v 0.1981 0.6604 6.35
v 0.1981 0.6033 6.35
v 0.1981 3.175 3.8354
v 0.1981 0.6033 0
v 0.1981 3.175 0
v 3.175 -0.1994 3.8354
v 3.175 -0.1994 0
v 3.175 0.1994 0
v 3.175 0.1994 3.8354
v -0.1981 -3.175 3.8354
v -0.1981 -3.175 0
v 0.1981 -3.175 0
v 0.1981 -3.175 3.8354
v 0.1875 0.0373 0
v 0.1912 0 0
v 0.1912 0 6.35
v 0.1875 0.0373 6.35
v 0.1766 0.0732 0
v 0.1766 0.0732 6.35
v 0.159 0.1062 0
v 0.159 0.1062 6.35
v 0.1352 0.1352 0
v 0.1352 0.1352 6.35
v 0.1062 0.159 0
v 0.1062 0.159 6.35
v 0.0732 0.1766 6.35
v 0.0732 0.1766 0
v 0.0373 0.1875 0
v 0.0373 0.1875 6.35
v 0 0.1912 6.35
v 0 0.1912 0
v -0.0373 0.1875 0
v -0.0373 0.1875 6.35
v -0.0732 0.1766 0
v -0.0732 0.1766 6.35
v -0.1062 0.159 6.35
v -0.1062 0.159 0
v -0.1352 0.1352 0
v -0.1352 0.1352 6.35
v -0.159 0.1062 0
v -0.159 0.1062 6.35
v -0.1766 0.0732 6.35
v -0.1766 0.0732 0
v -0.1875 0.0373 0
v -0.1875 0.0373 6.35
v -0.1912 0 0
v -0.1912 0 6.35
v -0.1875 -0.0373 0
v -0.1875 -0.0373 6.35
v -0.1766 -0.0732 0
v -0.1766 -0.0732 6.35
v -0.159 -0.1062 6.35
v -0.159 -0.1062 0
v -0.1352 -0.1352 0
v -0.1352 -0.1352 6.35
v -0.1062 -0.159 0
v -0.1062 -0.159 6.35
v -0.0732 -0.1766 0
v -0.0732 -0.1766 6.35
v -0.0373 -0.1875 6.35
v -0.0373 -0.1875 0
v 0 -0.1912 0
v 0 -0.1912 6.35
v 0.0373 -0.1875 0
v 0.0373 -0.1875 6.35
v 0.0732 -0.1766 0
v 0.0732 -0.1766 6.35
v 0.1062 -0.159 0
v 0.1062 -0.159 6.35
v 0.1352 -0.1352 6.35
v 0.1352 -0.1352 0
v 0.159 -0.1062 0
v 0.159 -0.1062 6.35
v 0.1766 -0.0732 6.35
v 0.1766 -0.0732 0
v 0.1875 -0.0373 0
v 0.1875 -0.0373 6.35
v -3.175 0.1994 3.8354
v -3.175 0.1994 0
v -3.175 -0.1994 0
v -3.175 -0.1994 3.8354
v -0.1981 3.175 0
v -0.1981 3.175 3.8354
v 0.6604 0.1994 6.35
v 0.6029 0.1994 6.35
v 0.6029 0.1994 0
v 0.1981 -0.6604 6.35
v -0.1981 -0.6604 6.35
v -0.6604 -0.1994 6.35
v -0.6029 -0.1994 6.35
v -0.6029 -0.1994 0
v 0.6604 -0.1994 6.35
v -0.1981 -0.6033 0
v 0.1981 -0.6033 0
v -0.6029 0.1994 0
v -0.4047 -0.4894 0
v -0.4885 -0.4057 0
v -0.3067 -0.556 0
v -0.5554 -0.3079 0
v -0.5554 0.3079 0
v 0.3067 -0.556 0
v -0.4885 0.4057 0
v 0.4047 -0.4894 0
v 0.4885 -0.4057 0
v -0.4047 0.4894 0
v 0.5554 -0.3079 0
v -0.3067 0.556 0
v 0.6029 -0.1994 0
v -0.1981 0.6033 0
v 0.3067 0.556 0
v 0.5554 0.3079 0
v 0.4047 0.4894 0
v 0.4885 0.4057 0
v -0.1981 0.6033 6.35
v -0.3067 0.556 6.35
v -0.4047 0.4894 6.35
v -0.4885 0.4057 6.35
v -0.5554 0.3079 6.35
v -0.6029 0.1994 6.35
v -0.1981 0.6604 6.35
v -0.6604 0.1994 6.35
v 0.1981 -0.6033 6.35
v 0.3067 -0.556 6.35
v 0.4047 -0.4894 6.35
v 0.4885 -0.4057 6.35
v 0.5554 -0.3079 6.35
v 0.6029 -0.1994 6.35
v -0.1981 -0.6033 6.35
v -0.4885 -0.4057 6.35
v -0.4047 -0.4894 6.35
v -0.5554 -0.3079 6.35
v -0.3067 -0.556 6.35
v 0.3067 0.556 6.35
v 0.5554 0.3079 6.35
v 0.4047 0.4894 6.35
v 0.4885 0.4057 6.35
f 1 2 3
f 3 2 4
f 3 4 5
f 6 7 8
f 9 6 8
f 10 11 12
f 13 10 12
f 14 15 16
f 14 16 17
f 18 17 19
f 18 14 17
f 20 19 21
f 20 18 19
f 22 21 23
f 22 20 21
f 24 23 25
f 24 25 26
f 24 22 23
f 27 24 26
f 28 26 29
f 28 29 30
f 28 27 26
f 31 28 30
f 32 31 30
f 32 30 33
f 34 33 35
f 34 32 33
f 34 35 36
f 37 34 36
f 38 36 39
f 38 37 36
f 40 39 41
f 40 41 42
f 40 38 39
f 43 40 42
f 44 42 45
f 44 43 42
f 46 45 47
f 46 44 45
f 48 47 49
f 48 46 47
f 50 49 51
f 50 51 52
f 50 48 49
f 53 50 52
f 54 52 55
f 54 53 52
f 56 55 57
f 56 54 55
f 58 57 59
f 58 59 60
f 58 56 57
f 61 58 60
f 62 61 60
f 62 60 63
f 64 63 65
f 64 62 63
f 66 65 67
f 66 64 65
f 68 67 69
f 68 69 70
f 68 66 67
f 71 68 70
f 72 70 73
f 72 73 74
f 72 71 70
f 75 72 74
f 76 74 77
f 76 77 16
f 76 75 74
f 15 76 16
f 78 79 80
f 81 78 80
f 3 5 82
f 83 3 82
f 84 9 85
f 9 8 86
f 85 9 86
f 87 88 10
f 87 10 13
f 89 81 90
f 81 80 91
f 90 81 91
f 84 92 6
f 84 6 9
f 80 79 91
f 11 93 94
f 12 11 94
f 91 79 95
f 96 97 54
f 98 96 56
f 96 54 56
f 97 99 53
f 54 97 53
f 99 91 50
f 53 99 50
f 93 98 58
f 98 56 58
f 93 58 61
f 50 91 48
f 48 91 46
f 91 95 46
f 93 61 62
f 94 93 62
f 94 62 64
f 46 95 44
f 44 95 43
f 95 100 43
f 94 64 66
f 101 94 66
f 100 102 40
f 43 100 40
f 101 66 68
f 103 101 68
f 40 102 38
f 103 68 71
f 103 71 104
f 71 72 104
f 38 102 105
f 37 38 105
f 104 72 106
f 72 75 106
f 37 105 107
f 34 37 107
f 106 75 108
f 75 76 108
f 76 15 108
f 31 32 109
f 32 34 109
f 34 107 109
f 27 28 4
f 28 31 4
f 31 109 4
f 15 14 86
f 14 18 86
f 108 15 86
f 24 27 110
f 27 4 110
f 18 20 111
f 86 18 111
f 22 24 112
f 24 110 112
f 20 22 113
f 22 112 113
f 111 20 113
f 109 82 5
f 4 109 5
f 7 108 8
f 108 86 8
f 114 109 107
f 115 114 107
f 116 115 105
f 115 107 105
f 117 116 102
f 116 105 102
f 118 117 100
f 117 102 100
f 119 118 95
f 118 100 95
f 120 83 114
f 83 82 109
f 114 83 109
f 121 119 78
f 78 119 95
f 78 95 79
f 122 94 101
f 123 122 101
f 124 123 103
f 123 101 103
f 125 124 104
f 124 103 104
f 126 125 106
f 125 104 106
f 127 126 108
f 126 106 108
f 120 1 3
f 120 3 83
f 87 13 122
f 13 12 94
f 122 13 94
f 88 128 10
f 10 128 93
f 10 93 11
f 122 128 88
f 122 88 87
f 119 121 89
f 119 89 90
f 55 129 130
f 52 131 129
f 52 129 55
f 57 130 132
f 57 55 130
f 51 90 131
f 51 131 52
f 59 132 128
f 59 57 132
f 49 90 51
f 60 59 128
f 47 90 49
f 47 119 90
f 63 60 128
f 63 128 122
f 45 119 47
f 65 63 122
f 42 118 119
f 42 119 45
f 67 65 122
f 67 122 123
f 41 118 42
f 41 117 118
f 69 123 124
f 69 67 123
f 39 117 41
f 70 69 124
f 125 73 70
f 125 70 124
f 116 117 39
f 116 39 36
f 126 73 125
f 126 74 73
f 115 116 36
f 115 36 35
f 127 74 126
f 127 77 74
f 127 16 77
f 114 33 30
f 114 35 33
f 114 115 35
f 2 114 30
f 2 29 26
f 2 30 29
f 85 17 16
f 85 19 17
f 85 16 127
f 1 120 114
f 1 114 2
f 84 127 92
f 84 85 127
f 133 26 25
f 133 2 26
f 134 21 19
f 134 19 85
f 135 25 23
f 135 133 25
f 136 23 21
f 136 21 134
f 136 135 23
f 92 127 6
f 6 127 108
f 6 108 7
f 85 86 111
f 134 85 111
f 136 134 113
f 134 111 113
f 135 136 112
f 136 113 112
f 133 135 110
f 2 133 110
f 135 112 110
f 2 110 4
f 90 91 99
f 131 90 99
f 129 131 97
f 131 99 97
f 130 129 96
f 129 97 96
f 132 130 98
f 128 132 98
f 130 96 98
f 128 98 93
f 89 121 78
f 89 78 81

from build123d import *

# Parameters (mm, degrees)
F0_R     = 0.191188
F1_DEPTH = 6.35
F2_SIZE  = 2.5146


with BuildPart() as f1:
    # F0 (on Top) → F1 (new body)
    with BuildSketch(Plane.XY):
        with BuildLine():
            Line((0.602884, -0.19939), (3.175, -0.19939))
            Line((3.175, -0.19939), (3.175, 0.19939))
            Line((3.175, 0.19939), (0.602884, 0.19939))
            ThreePointArc((0.602884, 0.19939), (0.44854, 0.449485), (0.19812, 0.603302))
            Line((0.19812, 0.603302), (0.19812, 3.175))
            Line((0.19812, 3.175), (-0.19812, 3.175))
            Line((-0.19812, 3.175), (-0.19812, 0.603302))
            ThreePointArc((-0.19812, 0.603302), (-0.44854, 0.449485), (-0.602884, 0.19939))
            Line((-0.602884, 0.19939), (-3.175, 0.19939))
            Line((-3.175, 0.19939), (-3.175, -0.19939))
            Line((-3.175, -0.19939), (-0.602884, -0.19939))
            ThreePointArc((-0.602884, -0.19939), (-0.44854, -0.449485), (-0.19812, -0.603302))
            Line((-0.19812, -0.603302), (-0.19812, -3.175))
            Line((-0.19812, -3.175), (0.19812, -3.175))
            Line((0.19812, -3.175), (0.19812, -0.603302))
            ThreePointArc((0.19812, -0.603302), (0.44854, -0.449485), (0.602884, -0.19939))
        make_face()
        Circle(F0_R, mode=Mode.SUBTRACT)
    extrude(amount=F1_DEPTH)

    # F2
    f2_edges = [f1.edges().sort_by_distance(p)[0] for p in [
        (0, -3.175, 6.35),
        (-3.175, 0, 6.35),
        (3.175, 0, 6.35),
        (0, 3.175, 6.35),
    ]]
    chamfer(f2_edges, length=F2_SIZE)


solid = f1.part
